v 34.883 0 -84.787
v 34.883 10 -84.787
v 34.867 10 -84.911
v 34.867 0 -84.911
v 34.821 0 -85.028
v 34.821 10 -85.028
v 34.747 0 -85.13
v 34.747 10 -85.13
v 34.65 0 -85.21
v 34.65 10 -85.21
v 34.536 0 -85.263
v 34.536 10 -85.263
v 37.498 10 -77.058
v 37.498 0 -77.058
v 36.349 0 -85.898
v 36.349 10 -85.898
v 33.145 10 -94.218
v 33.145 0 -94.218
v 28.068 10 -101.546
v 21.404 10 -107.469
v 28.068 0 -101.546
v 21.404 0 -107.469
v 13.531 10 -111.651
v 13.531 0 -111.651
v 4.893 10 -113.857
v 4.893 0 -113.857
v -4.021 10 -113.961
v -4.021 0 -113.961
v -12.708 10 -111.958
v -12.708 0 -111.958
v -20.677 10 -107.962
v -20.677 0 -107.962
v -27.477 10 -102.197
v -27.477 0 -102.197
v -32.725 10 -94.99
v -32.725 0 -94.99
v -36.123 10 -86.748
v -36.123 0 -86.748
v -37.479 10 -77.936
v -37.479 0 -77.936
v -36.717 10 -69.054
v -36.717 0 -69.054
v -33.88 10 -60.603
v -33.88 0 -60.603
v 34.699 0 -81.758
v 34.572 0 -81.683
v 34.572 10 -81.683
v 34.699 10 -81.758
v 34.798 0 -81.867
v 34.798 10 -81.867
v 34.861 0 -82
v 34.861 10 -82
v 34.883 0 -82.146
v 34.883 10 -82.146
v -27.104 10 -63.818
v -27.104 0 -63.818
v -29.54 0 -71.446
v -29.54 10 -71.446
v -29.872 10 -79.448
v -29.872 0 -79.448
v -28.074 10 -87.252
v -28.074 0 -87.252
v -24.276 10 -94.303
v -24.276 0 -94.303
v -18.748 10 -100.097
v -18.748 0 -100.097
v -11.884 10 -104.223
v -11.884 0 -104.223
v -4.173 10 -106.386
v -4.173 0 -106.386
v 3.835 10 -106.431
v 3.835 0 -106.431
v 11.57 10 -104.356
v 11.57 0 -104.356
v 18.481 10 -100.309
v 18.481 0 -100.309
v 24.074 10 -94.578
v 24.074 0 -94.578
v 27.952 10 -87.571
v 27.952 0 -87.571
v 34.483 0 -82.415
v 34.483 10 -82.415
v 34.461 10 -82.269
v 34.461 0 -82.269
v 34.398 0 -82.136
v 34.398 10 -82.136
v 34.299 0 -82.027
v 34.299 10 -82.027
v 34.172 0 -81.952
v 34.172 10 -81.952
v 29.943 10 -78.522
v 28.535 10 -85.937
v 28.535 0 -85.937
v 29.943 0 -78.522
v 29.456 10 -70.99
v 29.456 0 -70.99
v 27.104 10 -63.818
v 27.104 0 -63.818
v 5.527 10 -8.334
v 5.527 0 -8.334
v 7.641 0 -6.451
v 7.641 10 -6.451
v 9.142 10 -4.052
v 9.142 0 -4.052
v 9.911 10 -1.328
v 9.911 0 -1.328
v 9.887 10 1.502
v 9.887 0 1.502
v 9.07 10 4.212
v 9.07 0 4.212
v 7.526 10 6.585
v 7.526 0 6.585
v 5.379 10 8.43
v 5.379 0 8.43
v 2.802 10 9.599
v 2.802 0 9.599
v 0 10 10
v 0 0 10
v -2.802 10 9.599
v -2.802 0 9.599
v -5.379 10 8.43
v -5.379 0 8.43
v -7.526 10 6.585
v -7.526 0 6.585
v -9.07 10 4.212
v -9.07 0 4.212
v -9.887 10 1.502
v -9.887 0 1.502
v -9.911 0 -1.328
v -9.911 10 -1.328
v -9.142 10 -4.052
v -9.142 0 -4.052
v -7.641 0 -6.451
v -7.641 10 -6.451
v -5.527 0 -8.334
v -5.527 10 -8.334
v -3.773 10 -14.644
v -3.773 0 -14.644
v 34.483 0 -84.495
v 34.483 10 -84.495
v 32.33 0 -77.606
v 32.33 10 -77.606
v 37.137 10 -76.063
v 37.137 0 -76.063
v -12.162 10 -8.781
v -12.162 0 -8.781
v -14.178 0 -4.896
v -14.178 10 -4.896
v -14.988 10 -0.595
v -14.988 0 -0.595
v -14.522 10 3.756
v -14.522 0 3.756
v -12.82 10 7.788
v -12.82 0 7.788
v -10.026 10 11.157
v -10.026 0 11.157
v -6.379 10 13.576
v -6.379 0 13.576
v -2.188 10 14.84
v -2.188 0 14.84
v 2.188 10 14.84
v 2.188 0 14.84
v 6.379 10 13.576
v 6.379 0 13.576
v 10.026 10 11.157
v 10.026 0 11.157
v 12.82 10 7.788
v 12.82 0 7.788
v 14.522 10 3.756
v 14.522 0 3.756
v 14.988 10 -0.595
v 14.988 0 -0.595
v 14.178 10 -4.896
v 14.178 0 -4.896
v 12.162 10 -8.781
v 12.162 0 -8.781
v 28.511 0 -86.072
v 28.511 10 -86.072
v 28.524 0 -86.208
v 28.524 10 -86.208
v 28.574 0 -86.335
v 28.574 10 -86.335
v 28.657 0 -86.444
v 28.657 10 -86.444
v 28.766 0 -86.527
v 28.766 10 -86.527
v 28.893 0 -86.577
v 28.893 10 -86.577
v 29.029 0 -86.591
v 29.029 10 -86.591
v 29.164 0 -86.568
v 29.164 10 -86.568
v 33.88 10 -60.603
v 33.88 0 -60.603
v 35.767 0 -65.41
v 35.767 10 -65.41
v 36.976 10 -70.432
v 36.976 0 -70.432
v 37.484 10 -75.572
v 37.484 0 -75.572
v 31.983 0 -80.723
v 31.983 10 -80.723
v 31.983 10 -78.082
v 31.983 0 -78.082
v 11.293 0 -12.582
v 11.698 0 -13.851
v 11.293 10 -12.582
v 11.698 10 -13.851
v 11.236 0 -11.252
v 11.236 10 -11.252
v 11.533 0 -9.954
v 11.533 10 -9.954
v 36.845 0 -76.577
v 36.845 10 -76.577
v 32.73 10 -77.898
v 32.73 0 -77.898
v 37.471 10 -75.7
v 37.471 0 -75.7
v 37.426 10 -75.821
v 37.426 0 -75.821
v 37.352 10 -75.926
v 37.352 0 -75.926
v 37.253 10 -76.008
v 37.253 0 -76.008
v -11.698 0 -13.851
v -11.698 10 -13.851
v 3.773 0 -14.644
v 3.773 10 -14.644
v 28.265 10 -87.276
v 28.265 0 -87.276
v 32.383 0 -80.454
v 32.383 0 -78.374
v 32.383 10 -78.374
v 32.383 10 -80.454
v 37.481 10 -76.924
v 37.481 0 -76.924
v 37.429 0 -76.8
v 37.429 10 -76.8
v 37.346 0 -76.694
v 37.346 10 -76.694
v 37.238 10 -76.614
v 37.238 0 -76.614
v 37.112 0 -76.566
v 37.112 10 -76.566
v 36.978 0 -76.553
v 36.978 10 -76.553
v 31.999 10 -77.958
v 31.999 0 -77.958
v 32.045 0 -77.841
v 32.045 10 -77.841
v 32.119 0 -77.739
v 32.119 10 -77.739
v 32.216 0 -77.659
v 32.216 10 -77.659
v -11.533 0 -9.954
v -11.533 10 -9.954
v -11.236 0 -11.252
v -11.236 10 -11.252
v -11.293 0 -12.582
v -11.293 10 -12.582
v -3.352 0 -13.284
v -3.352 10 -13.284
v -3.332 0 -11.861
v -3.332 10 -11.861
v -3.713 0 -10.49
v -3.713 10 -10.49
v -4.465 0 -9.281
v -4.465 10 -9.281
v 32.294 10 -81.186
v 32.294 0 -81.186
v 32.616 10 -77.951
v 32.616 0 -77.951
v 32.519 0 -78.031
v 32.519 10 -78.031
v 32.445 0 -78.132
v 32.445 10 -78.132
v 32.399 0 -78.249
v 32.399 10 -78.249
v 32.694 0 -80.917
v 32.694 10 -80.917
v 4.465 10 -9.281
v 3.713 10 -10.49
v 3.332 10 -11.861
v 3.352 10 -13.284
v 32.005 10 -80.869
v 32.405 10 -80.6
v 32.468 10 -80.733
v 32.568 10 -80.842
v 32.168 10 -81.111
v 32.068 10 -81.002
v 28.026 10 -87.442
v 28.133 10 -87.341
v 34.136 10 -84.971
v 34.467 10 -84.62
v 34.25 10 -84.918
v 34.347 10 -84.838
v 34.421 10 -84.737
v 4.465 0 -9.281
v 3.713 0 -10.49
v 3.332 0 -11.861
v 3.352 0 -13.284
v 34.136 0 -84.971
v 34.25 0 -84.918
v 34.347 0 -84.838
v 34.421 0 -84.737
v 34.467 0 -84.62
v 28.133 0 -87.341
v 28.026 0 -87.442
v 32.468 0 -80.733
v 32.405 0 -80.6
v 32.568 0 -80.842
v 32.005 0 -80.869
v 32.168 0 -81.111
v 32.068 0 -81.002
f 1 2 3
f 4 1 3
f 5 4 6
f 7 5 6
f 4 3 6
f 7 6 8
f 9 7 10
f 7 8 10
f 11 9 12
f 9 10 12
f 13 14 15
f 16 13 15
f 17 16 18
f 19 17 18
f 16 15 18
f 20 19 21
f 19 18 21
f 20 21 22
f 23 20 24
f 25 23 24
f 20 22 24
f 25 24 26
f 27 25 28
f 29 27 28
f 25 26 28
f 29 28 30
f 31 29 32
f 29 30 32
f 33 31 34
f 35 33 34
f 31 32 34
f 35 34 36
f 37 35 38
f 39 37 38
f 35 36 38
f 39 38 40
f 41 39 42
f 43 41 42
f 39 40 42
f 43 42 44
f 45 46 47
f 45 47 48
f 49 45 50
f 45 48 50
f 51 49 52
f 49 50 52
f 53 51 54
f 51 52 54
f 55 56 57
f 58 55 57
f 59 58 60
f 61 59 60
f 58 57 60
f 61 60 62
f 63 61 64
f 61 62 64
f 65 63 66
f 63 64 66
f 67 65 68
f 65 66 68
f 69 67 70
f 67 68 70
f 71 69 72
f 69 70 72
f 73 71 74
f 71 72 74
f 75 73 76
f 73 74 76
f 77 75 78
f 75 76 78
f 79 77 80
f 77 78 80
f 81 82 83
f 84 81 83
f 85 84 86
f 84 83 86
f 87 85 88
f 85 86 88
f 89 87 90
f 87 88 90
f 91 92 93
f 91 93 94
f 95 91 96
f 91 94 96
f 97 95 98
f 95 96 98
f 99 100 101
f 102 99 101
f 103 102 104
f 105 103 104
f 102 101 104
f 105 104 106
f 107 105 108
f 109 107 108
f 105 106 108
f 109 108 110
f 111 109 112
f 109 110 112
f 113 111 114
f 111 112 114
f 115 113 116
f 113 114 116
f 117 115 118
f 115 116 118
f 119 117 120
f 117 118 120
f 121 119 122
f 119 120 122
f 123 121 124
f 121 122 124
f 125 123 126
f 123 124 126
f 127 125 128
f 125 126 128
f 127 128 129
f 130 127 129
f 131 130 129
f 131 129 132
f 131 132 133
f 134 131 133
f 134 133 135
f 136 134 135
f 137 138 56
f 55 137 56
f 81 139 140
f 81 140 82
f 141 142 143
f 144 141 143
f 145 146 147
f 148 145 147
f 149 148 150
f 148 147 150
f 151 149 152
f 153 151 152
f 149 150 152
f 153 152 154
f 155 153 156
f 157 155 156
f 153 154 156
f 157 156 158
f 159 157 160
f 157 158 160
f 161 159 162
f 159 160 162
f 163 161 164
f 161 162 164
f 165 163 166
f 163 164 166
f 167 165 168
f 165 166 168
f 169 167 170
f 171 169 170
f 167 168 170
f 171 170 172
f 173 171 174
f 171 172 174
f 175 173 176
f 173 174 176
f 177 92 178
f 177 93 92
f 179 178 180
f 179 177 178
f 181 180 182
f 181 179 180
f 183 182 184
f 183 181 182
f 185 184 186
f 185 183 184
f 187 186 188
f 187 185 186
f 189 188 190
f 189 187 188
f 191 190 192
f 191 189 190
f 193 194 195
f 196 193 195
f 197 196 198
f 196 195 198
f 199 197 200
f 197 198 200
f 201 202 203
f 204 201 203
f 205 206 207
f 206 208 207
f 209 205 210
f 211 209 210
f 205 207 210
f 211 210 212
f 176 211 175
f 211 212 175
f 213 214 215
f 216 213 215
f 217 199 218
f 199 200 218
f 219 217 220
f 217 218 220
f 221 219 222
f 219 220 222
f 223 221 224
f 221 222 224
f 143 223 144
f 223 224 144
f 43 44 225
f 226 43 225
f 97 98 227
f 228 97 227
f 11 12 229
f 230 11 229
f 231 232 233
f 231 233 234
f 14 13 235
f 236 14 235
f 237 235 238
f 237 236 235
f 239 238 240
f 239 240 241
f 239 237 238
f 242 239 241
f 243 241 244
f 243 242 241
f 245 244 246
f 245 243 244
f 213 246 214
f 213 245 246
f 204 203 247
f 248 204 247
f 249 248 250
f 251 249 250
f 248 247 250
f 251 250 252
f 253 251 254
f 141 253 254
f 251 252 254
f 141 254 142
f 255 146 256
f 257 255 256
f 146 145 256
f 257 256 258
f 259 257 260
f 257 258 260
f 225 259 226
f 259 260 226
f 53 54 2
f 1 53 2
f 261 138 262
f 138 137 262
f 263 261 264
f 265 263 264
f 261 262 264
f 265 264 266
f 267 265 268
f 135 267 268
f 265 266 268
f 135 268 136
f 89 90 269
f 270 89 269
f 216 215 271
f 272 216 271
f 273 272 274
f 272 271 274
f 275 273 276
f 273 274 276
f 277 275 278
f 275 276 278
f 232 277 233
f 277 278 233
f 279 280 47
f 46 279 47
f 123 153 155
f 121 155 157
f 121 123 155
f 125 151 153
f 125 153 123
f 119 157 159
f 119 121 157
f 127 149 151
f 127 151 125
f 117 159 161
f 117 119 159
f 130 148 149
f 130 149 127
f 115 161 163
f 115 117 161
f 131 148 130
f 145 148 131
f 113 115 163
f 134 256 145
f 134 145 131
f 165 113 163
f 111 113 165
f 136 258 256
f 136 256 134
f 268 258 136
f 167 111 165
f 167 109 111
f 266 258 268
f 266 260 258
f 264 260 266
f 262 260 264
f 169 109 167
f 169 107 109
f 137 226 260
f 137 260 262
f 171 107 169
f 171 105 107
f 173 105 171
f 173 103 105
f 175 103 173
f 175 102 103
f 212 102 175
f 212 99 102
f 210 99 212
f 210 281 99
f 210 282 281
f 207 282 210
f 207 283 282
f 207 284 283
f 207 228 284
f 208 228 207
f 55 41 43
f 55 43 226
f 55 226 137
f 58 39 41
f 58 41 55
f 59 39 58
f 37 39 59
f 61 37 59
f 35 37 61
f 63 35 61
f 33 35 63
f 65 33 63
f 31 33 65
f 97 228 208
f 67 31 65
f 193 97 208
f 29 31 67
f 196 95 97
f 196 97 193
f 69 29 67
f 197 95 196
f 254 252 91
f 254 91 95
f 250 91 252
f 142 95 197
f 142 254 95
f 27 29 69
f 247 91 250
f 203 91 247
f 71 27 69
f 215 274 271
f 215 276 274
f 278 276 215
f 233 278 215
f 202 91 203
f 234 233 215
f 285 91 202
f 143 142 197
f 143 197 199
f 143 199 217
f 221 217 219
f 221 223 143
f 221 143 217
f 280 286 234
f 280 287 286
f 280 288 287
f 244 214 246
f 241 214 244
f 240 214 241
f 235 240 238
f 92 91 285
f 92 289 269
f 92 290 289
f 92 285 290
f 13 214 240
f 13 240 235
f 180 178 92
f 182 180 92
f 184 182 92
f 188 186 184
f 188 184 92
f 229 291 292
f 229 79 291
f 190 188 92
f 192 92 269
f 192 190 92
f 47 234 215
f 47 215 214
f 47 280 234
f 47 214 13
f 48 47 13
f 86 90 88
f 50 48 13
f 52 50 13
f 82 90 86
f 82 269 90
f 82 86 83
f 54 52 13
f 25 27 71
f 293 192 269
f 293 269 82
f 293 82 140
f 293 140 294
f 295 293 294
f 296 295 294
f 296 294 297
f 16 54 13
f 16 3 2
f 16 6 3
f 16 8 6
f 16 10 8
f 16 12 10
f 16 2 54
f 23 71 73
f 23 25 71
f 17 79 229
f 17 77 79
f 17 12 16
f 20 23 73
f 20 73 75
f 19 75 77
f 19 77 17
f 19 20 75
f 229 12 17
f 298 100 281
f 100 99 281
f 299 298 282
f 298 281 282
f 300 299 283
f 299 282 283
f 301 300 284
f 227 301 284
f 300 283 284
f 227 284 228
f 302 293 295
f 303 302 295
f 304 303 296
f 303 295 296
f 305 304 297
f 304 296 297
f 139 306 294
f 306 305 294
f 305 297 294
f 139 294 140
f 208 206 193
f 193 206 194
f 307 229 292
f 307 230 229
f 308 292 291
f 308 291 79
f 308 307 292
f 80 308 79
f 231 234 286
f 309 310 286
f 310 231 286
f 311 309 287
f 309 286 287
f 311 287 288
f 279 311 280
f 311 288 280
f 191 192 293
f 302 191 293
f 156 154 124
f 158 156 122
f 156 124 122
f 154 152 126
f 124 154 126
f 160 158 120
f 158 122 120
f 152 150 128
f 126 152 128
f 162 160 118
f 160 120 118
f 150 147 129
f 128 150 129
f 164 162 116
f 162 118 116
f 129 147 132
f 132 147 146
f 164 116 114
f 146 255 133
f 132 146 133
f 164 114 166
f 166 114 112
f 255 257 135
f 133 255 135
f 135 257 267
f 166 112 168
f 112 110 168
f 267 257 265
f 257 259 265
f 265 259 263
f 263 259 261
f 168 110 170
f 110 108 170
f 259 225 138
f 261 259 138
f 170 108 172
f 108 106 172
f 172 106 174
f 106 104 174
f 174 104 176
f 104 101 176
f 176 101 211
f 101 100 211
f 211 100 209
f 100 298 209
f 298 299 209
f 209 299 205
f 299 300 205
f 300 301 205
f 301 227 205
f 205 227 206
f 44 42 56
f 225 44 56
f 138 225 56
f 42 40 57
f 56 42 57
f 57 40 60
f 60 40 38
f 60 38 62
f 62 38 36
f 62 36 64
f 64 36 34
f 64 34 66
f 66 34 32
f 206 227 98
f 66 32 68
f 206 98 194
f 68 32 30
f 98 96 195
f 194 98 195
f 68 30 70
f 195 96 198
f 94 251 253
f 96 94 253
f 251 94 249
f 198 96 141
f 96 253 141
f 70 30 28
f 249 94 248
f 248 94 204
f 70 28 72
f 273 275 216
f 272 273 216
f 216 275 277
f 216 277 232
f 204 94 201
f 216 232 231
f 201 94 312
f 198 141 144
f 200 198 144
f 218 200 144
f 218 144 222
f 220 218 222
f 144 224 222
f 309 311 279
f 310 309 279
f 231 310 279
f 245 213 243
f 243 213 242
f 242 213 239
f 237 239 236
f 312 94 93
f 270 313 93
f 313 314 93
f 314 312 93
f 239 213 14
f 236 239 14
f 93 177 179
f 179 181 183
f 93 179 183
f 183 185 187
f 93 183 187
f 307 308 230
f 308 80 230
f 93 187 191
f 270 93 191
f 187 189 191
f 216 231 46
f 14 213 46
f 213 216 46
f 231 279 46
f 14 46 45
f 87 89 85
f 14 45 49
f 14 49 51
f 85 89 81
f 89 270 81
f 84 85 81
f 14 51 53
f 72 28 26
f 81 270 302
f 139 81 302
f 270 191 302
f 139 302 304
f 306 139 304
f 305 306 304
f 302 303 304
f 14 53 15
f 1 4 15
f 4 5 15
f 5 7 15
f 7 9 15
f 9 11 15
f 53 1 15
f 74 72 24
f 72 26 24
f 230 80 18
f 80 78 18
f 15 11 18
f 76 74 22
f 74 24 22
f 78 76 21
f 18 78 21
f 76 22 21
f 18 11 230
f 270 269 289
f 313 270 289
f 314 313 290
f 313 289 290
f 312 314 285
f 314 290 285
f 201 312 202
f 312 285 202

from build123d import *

# Parameters (mm, degrees)
BOSS_EXTRUDE1_DEPTH = 10
FILLET1_R           = 5
CUT_EXTRUDE1_DEPTH  = 121.593129692
FILLET2_R           = 0.5


with BuildPart() as part:
    # Sketch1 → Boss-Extrude1 (new body)
    with BuildSketch(Plane(origin=(0, 0, 0), x_dir=(1, 0, 0), z_dir=(0, 1, 0))):
        with BuildLine():
            Line((10.30016758, 10.9044279), (33.8799835, 60.602564318))
            ThreePointArc((33.8799835, 60.602564318), (0, 114.177287273), (-33.8799835, 60.602564318))
            Line((-33.8799835, 60.602564318), (-10.30016758, 10.9044279))
            ThreePointArc((-10.30016758, 10.9044279), (0, -15), (10.30016758, 10.9044279))
        make_face()
        with BuildLine():
            Line((27.1039868, 63.817508909), (1.514929585, 9.884583368))
            ThreePointArc((1.514929585, 9.884583368), (0, -10), (-1.514929585, 9.884583368))
            Line((-1.514929585, 9.884583368), (-27.1039868, 63.817508909))
            ThreePointArc((-27.1039868, 63.817508909), (0, 106.677287273), (27.1039868, 63.817508909))
        make_face(mode=Mode.SUBTRACT)
    extrude(amount=BOSS_EXTRUDE1_DEPTH)

    # Fillet1
    fillet1_edges = [part.edges().sort_by_distance(p)[0] for p in [
        (10.30016758, 5, -10.9044279),
        (-10.30016758, 5, -10.9044279),
        (1.514929585, 5, -9.884583368),
        (-1.514929585, 5, -9.884583368),
    ]]
    fillet(fillet1_edges, radius=FILLET1_R)

    # Sketch2 → Cut-Extrude1 (cut, through all)
    with BuildSketch(Plane(origin=(0, 10, 0), x_dir=(1, 0, 0), z_dir=(0, 1, 0))):
        with BuildLine():
            Line((21.877604248, 88.906739184), (34.135902296, 84.971177619))
            ThreePointArc((34.135902296, 84.971177619), (34.387053168, 84.789711637), (34.483059832, 84.495111257))
            Line((34.483059832, 84.495111257), (34.483059832, 82.414608392))
            ThreePointArc((34.483059832, 82.414608392), (34.398003238, 82.135642498), (34.171771953, 81.95158816))
            Line((34.171771953, 81.95158816), (32.294347711, 81.186410559))
            ThreePointArc((32.294347711, 81.186410559), (32.068116426, 81.00235622), (31.983059832, 80.723390327))
            Line((31.983059832, 80.723390327), (31.983059832, 78.082279644))
            ThreePointArc((31.983059832, 78.082279644), (32.079066495, 77.787679264), (32.330217368, 77.606213282))
            Line((32.330217368, 77.606213282), (46.132813135, 73.174850528))
            Line((46.132813135, 73.174850528), (46.255087106, 73.555703617))
            Line((46.255087106, 73.555703617), (32.730217368, 77.897901638))
            ThreePointArc((32.730217368, 77.897901638), (32.479066495, 78.07936762), (32.383059832, 78.373968))
            Line((32.383059832, 78.373968), (32.383059832, 80.454470865))
            ThreePointArc((32.383059832, 80.454470865), (32.468116426, 80.733436759), (32.694347711, 80.917491097))
            Line((32.694347711, 80.917491097), (34.571771953, 81.682668698))
            ThreePointArc((34.571771953, 81.682668698), (34.798003238, 81.866723036), (34.883059832, 82.14568893))
            Line((34.883059832, 82.14568893), (34.883059832, 84.786799612))
            ThreePointArc((34.883059832, 84.786799612), (34.787053168, 85.081399993), (34.535902296, 85.262865975))
            Line((34.535902296, 85.262865975), (21.999878219, 89.287592274))
            Line((21.999878219, 89.287592274), (21.877604248, 88.906739184))
        make_face()
    extrude(amount=-CUT_EXTRUDE1_DEPTH, mode=Mode.SUBTRACT)

    # Fillet2
    fillet2_edges = [part.edges().sort_by_distance(p)[0] for p in [
        (28.037681738, 5, -87.349138226),
        (37.498715951, 5, -76.366961562),
        (37.492921713, 5, -75.948712321),
        (28.214590334, 5, -86.87223172),
    ]]
    fillet(fillet2_edges, radius=FILLET2_R)


solid = part.part
